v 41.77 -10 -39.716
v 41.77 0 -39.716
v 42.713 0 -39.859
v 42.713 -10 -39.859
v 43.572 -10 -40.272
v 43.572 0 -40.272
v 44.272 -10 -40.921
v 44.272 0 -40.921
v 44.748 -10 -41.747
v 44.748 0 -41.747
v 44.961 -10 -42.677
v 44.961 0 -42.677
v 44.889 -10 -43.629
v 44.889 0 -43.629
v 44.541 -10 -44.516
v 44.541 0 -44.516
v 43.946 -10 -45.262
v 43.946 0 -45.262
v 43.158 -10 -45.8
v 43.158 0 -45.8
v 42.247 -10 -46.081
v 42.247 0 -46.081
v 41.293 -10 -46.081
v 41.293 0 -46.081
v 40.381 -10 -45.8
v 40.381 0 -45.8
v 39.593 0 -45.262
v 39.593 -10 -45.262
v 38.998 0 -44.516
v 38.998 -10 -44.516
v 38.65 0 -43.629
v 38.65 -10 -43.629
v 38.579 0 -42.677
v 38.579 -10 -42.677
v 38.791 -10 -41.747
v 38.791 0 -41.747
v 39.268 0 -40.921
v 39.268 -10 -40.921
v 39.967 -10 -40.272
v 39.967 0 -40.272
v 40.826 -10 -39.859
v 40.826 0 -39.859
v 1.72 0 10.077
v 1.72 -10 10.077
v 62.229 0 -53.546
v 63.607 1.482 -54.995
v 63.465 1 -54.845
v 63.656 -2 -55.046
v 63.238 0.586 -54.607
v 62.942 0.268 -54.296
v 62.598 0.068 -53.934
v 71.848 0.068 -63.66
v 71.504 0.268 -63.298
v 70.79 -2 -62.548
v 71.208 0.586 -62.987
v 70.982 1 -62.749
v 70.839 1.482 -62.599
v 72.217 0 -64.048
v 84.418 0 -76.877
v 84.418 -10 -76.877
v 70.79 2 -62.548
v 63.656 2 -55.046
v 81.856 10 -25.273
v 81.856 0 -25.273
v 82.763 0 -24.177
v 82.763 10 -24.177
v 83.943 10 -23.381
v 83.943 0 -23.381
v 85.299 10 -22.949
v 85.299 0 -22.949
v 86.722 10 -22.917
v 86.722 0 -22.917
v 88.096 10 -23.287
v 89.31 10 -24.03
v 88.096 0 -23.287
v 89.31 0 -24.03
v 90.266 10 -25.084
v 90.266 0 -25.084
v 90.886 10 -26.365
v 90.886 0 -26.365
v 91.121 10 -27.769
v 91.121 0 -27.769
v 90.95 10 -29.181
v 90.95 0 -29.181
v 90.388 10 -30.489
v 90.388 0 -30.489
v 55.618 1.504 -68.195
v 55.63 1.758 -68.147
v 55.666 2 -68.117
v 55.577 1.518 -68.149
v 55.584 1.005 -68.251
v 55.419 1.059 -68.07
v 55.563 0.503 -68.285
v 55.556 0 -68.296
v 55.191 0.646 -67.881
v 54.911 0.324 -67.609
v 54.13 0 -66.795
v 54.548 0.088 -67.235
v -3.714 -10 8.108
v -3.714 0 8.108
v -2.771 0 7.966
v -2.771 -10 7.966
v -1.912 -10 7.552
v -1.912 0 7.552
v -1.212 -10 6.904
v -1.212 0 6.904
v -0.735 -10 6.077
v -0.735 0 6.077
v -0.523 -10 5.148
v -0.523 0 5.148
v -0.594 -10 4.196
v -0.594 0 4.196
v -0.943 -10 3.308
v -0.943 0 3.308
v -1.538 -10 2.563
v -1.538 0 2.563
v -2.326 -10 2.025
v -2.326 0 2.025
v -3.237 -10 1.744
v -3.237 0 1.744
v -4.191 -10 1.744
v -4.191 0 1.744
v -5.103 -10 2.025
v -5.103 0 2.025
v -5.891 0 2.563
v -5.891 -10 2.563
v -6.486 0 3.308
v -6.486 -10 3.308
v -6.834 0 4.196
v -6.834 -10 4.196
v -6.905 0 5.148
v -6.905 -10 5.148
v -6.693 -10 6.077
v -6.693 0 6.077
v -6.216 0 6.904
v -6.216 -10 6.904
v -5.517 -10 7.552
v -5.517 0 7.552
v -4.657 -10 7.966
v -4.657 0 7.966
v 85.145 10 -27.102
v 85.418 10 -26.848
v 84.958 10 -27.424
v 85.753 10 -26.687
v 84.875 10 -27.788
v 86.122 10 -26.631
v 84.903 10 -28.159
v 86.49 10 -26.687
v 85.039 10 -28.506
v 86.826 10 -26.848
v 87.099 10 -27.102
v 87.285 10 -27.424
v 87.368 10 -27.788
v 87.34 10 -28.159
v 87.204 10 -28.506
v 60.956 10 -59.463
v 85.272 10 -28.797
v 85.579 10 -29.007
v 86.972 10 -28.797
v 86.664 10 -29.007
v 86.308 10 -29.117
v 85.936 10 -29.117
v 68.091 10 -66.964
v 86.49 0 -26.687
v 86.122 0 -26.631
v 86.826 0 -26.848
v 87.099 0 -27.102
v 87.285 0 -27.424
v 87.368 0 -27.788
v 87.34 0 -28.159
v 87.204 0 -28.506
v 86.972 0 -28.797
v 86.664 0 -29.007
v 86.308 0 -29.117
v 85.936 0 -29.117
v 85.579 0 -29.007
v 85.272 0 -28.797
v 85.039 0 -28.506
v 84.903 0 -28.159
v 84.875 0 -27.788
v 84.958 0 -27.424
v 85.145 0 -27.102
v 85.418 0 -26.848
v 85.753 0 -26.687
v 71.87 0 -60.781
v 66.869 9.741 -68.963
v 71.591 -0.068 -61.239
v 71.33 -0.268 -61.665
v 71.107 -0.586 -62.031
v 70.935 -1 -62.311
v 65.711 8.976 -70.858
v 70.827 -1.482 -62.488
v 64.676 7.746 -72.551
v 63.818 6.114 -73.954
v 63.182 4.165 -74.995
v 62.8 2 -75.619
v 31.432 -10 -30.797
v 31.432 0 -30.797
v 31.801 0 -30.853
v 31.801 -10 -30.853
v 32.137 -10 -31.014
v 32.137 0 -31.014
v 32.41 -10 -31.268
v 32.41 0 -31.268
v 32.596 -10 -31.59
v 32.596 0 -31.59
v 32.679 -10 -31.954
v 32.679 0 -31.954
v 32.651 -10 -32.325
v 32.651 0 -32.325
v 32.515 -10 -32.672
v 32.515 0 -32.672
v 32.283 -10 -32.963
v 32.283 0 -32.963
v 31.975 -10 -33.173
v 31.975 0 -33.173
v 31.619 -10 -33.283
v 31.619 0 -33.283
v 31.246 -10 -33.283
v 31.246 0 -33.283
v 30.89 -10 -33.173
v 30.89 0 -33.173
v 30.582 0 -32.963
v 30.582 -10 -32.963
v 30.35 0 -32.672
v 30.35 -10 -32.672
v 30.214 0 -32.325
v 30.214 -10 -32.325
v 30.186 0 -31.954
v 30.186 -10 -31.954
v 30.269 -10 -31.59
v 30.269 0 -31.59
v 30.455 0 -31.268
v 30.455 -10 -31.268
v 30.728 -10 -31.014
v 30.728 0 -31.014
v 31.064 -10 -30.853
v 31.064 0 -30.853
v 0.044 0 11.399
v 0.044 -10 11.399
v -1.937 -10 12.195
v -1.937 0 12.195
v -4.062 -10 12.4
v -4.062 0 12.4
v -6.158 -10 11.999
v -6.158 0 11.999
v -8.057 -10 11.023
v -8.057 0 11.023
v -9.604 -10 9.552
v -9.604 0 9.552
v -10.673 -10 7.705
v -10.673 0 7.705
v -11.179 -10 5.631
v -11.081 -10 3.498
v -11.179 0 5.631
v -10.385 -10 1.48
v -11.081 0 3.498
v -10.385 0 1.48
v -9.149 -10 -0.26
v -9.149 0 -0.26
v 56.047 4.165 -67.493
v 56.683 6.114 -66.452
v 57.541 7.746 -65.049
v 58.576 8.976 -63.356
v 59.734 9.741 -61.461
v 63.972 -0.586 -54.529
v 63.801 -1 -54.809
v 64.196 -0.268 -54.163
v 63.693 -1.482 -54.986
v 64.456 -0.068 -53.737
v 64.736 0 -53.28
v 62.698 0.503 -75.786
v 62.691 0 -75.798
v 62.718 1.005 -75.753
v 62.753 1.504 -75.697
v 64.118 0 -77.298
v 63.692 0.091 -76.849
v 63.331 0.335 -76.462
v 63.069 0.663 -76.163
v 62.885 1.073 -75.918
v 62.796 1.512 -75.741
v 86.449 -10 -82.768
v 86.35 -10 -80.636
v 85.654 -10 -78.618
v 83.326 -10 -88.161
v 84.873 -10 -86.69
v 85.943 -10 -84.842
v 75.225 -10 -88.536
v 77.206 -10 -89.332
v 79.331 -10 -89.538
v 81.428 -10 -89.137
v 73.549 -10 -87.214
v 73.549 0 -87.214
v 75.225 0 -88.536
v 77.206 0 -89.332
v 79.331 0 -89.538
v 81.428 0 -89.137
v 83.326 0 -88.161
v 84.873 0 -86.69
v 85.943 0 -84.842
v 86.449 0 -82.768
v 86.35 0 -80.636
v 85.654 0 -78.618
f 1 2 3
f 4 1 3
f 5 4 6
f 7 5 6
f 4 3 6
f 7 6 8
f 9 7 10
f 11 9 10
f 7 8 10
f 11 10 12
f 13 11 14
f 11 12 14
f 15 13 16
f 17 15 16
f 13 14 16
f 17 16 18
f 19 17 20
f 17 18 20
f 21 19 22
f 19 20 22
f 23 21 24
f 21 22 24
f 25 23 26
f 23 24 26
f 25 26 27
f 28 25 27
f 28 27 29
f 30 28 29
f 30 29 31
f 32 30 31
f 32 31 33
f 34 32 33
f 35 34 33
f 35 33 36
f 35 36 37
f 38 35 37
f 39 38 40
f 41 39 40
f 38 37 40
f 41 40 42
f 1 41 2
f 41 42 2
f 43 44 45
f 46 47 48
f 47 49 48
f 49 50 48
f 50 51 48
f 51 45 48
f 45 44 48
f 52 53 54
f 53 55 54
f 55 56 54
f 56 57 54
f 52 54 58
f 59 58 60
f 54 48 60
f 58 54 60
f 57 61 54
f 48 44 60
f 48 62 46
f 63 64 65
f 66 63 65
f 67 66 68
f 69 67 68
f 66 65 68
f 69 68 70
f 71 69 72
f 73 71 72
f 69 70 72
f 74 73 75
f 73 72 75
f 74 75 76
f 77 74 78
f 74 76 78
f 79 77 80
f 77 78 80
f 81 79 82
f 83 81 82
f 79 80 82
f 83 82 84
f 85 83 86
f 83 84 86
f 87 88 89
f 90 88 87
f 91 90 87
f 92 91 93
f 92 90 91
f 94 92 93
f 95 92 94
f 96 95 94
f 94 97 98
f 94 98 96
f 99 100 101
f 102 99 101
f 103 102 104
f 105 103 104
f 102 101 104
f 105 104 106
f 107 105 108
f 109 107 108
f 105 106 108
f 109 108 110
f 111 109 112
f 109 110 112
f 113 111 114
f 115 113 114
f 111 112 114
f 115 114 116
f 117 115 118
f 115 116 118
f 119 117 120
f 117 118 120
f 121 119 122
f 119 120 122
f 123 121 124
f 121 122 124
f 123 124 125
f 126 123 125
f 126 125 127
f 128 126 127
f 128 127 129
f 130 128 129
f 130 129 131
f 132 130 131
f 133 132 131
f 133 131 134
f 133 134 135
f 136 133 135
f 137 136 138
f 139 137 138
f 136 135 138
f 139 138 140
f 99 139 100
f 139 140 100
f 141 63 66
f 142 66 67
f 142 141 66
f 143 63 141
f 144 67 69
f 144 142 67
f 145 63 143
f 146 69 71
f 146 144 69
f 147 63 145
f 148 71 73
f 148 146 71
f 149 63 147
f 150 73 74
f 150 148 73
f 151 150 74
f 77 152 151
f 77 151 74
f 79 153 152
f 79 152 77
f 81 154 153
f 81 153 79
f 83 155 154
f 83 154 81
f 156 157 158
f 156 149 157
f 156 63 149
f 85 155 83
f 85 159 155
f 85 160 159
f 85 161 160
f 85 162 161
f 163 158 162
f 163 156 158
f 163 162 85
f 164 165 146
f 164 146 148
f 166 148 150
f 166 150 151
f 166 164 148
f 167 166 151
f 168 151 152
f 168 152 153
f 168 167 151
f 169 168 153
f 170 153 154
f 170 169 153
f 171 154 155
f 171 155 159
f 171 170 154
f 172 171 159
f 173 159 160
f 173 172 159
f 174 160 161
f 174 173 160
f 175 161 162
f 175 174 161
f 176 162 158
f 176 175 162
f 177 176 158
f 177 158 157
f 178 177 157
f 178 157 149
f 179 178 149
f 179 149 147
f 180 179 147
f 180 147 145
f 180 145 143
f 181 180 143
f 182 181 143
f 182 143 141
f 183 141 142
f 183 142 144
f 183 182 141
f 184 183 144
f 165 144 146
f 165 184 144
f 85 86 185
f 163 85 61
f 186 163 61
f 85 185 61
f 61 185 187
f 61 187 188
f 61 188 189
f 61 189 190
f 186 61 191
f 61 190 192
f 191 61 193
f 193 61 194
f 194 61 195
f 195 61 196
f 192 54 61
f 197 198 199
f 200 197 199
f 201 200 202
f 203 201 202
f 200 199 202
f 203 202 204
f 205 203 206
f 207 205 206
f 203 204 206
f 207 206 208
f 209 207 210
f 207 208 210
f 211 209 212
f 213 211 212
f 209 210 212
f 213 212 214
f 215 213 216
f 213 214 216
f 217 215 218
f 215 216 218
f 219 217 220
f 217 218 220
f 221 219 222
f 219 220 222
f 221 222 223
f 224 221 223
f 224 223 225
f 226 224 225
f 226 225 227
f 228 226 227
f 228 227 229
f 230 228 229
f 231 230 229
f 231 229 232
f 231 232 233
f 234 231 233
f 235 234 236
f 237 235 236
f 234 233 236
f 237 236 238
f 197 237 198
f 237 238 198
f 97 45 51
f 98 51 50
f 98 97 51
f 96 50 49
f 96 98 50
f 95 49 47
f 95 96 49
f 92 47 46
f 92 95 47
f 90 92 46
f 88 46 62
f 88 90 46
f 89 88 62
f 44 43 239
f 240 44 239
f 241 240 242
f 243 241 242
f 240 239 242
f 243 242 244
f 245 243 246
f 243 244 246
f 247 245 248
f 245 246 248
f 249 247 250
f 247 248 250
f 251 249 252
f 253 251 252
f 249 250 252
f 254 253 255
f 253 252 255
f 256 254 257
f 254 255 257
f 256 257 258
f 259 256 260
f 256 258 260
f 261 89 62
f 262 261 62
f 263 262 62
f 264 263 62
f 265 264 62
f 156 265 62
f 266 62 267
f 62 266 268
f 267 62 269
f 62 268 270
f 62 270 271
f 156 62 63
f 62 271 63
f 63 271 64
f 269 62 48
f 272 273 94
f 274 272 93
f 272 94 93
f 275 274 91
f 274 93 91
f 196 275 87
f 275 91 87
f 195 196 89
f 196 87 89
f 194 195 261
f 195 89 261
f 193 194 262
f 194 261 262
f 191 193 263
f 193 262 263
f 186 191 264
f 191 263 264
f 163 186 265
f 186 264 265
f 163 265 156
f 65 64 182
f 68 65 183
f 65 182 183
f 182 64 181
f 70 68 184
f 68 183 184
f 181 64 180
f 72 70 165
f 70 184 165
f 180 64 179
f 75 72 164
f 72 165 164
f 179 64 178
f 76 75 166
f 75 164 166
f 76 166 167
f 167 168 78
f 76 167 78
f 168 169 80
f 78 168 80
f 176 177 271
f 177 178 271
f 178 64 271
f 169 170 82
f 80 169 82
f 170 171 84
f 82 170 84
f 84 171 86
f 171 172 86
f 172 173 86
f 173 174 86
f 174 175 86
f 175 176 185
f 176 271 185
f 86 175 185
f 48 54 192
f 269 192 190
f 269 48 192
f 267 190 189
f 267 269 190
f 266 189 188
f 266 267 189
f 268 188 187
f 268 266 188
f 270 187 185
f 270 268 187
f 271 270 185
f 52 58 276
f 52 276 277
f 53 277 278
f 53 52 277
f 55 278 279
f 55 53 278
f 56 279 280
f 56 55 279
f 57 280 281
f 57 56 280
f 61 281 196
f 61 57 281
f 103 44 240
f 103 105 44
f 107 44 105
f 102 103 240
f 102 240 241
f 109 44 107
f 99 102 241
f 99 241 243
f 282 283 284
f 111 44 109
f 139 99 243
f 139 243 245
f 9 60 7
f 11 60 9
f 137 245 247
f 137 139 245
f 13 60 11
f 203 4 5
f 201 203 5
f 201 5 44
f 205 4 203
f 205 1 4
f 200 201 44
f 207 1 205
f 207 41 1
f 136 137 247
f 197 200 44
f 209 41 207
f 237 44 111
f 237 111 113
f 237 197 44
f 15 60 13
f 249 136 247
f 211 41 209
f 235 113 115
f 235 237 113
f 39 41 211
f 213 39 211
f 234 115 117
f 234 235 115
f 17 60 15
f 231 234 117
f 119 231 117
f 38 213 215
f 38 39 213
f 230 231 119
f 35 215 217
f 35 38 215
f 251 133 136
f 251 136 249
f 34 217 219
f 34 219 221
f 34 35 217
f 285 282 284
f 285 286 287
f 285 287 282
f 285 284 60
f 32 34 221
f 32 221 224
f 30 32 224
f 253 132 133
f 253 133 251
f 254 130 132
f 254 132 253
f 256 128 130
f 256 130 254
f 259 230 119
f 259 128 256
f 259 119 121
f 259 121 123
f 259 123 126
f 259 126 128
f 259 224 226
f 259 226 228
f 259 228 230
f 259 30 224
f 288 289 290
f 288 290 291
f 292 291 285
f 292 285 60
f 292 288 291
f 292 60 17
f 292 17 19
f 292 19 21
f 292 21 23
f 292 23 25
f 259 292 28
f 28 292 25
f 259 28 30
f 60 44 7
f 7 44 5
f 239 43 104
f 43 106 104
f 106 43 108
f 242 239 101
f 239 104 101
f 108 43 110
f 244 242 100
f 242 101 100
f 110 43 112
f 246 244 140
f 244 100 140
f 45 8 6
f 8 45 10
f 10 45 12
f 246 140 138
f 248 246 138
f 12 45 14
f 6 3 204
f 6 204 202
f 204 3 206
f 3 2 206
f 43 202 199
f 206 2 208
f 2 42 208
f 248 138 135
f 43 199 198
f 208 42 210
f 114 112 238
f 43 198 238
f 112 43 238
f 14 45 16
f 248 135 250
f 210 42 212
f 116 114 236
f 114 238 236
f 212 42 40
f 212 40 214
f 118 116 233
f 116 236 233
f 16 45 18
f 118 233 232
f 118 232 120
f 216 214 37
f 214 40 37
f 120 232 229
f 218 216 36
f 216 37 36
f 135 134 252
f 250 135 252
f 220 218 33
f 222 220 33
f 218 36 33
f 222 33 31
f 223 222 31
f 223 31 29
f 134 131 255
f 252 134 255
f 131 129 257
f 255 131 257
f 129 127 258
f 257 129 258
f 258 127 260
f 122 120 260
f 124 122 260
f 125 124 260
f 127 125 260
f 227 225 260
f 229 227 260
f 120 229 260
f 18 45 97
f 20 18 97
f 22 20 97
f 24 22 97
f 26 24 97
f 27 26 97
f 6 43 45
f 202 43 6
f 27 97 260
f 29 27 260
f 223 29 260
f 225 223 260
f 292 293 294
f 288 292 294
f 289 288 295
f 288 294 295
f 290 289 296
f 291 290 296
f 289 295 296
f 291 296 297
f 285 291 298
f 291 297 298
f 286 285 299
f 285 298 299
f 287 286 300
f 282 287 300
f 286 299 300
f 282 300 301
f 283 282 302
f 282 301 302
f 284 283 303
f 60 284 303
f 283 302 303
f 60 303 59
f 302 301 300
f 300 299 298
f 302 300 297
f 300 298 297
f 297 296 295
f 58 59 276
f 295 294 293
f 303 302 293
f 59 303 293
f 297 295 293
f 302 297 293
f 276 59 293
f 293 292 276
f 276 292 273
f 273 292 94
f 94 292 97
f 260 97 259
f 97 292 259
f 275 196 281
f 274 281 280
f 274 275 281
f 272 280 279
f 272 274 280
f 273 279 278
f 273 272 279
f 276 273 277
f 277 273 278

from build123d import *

# Parameters (mm, degrees)
SKETCH1_R           = 3.2000000000000006
SKETCH1_R_2         = 3.2000000000000037
SKETCH1_R_3         = 1.2500000000000047
BOSS_EXTRUDE1_DEPTH = 10
SKETCH1_7_R         = 1.2500000000000122
BOSS_EXTRUDE2_DEPTH = 10
FILLET1_R           = 10
FILLET2_R           = 2
FILLET3_R           = 2


with BuildPart() as part:
    # Sketch1 → Boss-Extrude1 (new body)
    with BuildSketch(Plane(origin=(0, 0, 0), x_dir=(1, 0, 0), z_dir=(0, 1, 0))):
        with BuildLine():
            Line((-9.148889755102248, 0.2602426865805545), (73.5491158361503, 87.21448278577964))
            ThreePointArc((73.5491158361503, 87.21448278577964), (84.15238119180354, 87.48049744252629), (84.41839584855015, 76.87723208687311))
            Line((84.41839584855015, 76.87723208687311), (1.7203902572976446, -10.077008012326013))
            ThreePointArc((1.7203902572976446, -10.077008012326013), (-8.882875098355584, -10.343022669072676), (-9.148889755102248, 0.2602426865805545))
        make_face()
        with Locations(Location((-3.7142497489023008, -4.908382662872731, 0), (0, 0, 270))):
            Circle(SKETCH1_R, mode=Mode.SUBTRACT)
        with Locations(Location((41.769653326286615, 42.91644939168677, 0), (0, 0, 270))):
            Circle(SKETCH1_R_2, mode=Mode.SUBTRACT)
        with Locations(Location((31.432402627380036, 32.047169379286885, 0), (0, 0, 270))):
            Circle(SKETCH1_R_3, mode=Mode.SUBTRACT)
    extrude(amount=-BOSS_EXTRUDE1_DEPTH)

    # Sketch1<7> → Boss-Extrude2 (add)
    with BuildSketch(Plane(origin=(0, 0, 0), x_dir=(1, 0, 0), z_dir=(0, 1, 0))):
        with BuildLine():
            Line((62.691064287297834, 75.79759776372697), (55.55645800762751, 68.29579330036361))
            Line((55.55645800762751, 68.2957933003636), (81.85576990080861, 25.27333022283284))
            ThreePointArc((81.85576990080861, 25.27333022283284), (88.7296482404513, 23.61507916470229), (90.38789929858186, 30.488957504344977))
            Line((90.38789929858186, 30.488957504344977), (62.69106428729781, 75.79759776372696))
        make_face()
        with Locations(Location((86.12183459969525, 27.881143863588914, 0), (0, 0, 270))):
            Circle(SKETCH1_7_R, mode=Mode.SUBTRACT)
    extrude(amount=BOSS_EXTRUDE2_DEPTH)

    # Fillet1
    fillet1_edges = [part.edges().sort_by_distance(p)[0] for p in [
        (59.12376114746267, 10, -72.04669553204529),
    ]]
    fillet(fillet1_edges, radius=FILLET1_R)

    # Fillet2
    # the kernel refuses this fillet: 2 mm, written as the material it adds along each edge
    with BuildSketch(Plane(origin=(52.94864436687145, 0, -72.56185799925024), x_dir=(-0.853212939777324, 0, 0.5215627281512133), z_dir=(0.5215627281512133, 0, 0.853212939777324))) as fillet2_piece_1_section:
        with BuildLine():
            CenterArc((FILLET2_R, -FILLET2_R), FILLET2_R, 90, 90)
            Line((-6.06e-15, -FILLET2_R), (0, 0))
            Line((0, 0), (FILLET2_R, 0))
        make_face()
    fillet2_piece_1 = extrude(amount=25.52914270615122, mode=Mode.PRIVATE)
    fillet2_piece_1 = fillet2_piece_1 & Plane(origin=(61.097194422091576, 1.78e-15, -59.61106783019719), x_dir=(-0.7246186674933254, 0, -0.6891500465937715), z_dir=(-0.6891500465937715, 0, 0.7246186674933254)) * Cylinder(10, 60, mode=Mode.PRIVATE)
    fillet2_piece_1 = split(fillet2_piece_1, bisect_by=Plane(origin=(64.72028775955818, 0.44613502682003076, -56.16531759722836), z_dir=(-0.7246186674933262, 0, -0.6891500465937709)), keep=Keep.TOP, mode=Mode.PRIVATE)
    add(fillet2_piece_1)
    with BuildSketch(Plane(origin=(73.39829996372362, 0, -58.28186756430348), x_dir=(0.853212939777324, 0, -0.5215627281512135), z_dir=(-0.5215627281512135, 0, -0.8532129397773239))) as fillet2_piece_2_section:
        with BuildLine():
            CenterArc((FILLET2_R, -FILLET2_R), FILLET2_R, 90, 90)
            Line((0, -FILLET2_R), (0, 0))
            Line((0, 0), (FILLET2_R, 0))
        make_face()
    fillet2_piece_2 = extrude(amount=25.529142706151212, mode=Mode.PRIVATE)
    fillet2_piece_2 = fillet2_piece_2 & Plane(origin=(68.86970126476385, 1.78e-15, -67.78360381021702), x_dir=(-0.7246186674933254, 0, -0.6891500465937715), z_dir=(-0.6891500465937715, 0, 0.7246186674933254)) * Cylinder(10, 60, mode=Mode.PRIVATE)
    fillet2_piece_2 = split(fillet2_piece_2, bisect_by=Plane(origin=(72.49279460223045, 0.4461350127240334, -64.3378535772482), z_dir=(-0.7246186674933262, 0, -0.6891500465937709)), keep=Keep.TOP, mode=Mode.PRIVATE)
    add(fillet2_piece_2)

    # Fillet3
    fillet3_edges = [part.edges().sort_by_distance(p)[0] for p in [
        (67.22318318313239, 0, -58.797030031508406),
    ]]
    fillet(fillet3_edges, radius=FILLET3_R)


solid = part.part
